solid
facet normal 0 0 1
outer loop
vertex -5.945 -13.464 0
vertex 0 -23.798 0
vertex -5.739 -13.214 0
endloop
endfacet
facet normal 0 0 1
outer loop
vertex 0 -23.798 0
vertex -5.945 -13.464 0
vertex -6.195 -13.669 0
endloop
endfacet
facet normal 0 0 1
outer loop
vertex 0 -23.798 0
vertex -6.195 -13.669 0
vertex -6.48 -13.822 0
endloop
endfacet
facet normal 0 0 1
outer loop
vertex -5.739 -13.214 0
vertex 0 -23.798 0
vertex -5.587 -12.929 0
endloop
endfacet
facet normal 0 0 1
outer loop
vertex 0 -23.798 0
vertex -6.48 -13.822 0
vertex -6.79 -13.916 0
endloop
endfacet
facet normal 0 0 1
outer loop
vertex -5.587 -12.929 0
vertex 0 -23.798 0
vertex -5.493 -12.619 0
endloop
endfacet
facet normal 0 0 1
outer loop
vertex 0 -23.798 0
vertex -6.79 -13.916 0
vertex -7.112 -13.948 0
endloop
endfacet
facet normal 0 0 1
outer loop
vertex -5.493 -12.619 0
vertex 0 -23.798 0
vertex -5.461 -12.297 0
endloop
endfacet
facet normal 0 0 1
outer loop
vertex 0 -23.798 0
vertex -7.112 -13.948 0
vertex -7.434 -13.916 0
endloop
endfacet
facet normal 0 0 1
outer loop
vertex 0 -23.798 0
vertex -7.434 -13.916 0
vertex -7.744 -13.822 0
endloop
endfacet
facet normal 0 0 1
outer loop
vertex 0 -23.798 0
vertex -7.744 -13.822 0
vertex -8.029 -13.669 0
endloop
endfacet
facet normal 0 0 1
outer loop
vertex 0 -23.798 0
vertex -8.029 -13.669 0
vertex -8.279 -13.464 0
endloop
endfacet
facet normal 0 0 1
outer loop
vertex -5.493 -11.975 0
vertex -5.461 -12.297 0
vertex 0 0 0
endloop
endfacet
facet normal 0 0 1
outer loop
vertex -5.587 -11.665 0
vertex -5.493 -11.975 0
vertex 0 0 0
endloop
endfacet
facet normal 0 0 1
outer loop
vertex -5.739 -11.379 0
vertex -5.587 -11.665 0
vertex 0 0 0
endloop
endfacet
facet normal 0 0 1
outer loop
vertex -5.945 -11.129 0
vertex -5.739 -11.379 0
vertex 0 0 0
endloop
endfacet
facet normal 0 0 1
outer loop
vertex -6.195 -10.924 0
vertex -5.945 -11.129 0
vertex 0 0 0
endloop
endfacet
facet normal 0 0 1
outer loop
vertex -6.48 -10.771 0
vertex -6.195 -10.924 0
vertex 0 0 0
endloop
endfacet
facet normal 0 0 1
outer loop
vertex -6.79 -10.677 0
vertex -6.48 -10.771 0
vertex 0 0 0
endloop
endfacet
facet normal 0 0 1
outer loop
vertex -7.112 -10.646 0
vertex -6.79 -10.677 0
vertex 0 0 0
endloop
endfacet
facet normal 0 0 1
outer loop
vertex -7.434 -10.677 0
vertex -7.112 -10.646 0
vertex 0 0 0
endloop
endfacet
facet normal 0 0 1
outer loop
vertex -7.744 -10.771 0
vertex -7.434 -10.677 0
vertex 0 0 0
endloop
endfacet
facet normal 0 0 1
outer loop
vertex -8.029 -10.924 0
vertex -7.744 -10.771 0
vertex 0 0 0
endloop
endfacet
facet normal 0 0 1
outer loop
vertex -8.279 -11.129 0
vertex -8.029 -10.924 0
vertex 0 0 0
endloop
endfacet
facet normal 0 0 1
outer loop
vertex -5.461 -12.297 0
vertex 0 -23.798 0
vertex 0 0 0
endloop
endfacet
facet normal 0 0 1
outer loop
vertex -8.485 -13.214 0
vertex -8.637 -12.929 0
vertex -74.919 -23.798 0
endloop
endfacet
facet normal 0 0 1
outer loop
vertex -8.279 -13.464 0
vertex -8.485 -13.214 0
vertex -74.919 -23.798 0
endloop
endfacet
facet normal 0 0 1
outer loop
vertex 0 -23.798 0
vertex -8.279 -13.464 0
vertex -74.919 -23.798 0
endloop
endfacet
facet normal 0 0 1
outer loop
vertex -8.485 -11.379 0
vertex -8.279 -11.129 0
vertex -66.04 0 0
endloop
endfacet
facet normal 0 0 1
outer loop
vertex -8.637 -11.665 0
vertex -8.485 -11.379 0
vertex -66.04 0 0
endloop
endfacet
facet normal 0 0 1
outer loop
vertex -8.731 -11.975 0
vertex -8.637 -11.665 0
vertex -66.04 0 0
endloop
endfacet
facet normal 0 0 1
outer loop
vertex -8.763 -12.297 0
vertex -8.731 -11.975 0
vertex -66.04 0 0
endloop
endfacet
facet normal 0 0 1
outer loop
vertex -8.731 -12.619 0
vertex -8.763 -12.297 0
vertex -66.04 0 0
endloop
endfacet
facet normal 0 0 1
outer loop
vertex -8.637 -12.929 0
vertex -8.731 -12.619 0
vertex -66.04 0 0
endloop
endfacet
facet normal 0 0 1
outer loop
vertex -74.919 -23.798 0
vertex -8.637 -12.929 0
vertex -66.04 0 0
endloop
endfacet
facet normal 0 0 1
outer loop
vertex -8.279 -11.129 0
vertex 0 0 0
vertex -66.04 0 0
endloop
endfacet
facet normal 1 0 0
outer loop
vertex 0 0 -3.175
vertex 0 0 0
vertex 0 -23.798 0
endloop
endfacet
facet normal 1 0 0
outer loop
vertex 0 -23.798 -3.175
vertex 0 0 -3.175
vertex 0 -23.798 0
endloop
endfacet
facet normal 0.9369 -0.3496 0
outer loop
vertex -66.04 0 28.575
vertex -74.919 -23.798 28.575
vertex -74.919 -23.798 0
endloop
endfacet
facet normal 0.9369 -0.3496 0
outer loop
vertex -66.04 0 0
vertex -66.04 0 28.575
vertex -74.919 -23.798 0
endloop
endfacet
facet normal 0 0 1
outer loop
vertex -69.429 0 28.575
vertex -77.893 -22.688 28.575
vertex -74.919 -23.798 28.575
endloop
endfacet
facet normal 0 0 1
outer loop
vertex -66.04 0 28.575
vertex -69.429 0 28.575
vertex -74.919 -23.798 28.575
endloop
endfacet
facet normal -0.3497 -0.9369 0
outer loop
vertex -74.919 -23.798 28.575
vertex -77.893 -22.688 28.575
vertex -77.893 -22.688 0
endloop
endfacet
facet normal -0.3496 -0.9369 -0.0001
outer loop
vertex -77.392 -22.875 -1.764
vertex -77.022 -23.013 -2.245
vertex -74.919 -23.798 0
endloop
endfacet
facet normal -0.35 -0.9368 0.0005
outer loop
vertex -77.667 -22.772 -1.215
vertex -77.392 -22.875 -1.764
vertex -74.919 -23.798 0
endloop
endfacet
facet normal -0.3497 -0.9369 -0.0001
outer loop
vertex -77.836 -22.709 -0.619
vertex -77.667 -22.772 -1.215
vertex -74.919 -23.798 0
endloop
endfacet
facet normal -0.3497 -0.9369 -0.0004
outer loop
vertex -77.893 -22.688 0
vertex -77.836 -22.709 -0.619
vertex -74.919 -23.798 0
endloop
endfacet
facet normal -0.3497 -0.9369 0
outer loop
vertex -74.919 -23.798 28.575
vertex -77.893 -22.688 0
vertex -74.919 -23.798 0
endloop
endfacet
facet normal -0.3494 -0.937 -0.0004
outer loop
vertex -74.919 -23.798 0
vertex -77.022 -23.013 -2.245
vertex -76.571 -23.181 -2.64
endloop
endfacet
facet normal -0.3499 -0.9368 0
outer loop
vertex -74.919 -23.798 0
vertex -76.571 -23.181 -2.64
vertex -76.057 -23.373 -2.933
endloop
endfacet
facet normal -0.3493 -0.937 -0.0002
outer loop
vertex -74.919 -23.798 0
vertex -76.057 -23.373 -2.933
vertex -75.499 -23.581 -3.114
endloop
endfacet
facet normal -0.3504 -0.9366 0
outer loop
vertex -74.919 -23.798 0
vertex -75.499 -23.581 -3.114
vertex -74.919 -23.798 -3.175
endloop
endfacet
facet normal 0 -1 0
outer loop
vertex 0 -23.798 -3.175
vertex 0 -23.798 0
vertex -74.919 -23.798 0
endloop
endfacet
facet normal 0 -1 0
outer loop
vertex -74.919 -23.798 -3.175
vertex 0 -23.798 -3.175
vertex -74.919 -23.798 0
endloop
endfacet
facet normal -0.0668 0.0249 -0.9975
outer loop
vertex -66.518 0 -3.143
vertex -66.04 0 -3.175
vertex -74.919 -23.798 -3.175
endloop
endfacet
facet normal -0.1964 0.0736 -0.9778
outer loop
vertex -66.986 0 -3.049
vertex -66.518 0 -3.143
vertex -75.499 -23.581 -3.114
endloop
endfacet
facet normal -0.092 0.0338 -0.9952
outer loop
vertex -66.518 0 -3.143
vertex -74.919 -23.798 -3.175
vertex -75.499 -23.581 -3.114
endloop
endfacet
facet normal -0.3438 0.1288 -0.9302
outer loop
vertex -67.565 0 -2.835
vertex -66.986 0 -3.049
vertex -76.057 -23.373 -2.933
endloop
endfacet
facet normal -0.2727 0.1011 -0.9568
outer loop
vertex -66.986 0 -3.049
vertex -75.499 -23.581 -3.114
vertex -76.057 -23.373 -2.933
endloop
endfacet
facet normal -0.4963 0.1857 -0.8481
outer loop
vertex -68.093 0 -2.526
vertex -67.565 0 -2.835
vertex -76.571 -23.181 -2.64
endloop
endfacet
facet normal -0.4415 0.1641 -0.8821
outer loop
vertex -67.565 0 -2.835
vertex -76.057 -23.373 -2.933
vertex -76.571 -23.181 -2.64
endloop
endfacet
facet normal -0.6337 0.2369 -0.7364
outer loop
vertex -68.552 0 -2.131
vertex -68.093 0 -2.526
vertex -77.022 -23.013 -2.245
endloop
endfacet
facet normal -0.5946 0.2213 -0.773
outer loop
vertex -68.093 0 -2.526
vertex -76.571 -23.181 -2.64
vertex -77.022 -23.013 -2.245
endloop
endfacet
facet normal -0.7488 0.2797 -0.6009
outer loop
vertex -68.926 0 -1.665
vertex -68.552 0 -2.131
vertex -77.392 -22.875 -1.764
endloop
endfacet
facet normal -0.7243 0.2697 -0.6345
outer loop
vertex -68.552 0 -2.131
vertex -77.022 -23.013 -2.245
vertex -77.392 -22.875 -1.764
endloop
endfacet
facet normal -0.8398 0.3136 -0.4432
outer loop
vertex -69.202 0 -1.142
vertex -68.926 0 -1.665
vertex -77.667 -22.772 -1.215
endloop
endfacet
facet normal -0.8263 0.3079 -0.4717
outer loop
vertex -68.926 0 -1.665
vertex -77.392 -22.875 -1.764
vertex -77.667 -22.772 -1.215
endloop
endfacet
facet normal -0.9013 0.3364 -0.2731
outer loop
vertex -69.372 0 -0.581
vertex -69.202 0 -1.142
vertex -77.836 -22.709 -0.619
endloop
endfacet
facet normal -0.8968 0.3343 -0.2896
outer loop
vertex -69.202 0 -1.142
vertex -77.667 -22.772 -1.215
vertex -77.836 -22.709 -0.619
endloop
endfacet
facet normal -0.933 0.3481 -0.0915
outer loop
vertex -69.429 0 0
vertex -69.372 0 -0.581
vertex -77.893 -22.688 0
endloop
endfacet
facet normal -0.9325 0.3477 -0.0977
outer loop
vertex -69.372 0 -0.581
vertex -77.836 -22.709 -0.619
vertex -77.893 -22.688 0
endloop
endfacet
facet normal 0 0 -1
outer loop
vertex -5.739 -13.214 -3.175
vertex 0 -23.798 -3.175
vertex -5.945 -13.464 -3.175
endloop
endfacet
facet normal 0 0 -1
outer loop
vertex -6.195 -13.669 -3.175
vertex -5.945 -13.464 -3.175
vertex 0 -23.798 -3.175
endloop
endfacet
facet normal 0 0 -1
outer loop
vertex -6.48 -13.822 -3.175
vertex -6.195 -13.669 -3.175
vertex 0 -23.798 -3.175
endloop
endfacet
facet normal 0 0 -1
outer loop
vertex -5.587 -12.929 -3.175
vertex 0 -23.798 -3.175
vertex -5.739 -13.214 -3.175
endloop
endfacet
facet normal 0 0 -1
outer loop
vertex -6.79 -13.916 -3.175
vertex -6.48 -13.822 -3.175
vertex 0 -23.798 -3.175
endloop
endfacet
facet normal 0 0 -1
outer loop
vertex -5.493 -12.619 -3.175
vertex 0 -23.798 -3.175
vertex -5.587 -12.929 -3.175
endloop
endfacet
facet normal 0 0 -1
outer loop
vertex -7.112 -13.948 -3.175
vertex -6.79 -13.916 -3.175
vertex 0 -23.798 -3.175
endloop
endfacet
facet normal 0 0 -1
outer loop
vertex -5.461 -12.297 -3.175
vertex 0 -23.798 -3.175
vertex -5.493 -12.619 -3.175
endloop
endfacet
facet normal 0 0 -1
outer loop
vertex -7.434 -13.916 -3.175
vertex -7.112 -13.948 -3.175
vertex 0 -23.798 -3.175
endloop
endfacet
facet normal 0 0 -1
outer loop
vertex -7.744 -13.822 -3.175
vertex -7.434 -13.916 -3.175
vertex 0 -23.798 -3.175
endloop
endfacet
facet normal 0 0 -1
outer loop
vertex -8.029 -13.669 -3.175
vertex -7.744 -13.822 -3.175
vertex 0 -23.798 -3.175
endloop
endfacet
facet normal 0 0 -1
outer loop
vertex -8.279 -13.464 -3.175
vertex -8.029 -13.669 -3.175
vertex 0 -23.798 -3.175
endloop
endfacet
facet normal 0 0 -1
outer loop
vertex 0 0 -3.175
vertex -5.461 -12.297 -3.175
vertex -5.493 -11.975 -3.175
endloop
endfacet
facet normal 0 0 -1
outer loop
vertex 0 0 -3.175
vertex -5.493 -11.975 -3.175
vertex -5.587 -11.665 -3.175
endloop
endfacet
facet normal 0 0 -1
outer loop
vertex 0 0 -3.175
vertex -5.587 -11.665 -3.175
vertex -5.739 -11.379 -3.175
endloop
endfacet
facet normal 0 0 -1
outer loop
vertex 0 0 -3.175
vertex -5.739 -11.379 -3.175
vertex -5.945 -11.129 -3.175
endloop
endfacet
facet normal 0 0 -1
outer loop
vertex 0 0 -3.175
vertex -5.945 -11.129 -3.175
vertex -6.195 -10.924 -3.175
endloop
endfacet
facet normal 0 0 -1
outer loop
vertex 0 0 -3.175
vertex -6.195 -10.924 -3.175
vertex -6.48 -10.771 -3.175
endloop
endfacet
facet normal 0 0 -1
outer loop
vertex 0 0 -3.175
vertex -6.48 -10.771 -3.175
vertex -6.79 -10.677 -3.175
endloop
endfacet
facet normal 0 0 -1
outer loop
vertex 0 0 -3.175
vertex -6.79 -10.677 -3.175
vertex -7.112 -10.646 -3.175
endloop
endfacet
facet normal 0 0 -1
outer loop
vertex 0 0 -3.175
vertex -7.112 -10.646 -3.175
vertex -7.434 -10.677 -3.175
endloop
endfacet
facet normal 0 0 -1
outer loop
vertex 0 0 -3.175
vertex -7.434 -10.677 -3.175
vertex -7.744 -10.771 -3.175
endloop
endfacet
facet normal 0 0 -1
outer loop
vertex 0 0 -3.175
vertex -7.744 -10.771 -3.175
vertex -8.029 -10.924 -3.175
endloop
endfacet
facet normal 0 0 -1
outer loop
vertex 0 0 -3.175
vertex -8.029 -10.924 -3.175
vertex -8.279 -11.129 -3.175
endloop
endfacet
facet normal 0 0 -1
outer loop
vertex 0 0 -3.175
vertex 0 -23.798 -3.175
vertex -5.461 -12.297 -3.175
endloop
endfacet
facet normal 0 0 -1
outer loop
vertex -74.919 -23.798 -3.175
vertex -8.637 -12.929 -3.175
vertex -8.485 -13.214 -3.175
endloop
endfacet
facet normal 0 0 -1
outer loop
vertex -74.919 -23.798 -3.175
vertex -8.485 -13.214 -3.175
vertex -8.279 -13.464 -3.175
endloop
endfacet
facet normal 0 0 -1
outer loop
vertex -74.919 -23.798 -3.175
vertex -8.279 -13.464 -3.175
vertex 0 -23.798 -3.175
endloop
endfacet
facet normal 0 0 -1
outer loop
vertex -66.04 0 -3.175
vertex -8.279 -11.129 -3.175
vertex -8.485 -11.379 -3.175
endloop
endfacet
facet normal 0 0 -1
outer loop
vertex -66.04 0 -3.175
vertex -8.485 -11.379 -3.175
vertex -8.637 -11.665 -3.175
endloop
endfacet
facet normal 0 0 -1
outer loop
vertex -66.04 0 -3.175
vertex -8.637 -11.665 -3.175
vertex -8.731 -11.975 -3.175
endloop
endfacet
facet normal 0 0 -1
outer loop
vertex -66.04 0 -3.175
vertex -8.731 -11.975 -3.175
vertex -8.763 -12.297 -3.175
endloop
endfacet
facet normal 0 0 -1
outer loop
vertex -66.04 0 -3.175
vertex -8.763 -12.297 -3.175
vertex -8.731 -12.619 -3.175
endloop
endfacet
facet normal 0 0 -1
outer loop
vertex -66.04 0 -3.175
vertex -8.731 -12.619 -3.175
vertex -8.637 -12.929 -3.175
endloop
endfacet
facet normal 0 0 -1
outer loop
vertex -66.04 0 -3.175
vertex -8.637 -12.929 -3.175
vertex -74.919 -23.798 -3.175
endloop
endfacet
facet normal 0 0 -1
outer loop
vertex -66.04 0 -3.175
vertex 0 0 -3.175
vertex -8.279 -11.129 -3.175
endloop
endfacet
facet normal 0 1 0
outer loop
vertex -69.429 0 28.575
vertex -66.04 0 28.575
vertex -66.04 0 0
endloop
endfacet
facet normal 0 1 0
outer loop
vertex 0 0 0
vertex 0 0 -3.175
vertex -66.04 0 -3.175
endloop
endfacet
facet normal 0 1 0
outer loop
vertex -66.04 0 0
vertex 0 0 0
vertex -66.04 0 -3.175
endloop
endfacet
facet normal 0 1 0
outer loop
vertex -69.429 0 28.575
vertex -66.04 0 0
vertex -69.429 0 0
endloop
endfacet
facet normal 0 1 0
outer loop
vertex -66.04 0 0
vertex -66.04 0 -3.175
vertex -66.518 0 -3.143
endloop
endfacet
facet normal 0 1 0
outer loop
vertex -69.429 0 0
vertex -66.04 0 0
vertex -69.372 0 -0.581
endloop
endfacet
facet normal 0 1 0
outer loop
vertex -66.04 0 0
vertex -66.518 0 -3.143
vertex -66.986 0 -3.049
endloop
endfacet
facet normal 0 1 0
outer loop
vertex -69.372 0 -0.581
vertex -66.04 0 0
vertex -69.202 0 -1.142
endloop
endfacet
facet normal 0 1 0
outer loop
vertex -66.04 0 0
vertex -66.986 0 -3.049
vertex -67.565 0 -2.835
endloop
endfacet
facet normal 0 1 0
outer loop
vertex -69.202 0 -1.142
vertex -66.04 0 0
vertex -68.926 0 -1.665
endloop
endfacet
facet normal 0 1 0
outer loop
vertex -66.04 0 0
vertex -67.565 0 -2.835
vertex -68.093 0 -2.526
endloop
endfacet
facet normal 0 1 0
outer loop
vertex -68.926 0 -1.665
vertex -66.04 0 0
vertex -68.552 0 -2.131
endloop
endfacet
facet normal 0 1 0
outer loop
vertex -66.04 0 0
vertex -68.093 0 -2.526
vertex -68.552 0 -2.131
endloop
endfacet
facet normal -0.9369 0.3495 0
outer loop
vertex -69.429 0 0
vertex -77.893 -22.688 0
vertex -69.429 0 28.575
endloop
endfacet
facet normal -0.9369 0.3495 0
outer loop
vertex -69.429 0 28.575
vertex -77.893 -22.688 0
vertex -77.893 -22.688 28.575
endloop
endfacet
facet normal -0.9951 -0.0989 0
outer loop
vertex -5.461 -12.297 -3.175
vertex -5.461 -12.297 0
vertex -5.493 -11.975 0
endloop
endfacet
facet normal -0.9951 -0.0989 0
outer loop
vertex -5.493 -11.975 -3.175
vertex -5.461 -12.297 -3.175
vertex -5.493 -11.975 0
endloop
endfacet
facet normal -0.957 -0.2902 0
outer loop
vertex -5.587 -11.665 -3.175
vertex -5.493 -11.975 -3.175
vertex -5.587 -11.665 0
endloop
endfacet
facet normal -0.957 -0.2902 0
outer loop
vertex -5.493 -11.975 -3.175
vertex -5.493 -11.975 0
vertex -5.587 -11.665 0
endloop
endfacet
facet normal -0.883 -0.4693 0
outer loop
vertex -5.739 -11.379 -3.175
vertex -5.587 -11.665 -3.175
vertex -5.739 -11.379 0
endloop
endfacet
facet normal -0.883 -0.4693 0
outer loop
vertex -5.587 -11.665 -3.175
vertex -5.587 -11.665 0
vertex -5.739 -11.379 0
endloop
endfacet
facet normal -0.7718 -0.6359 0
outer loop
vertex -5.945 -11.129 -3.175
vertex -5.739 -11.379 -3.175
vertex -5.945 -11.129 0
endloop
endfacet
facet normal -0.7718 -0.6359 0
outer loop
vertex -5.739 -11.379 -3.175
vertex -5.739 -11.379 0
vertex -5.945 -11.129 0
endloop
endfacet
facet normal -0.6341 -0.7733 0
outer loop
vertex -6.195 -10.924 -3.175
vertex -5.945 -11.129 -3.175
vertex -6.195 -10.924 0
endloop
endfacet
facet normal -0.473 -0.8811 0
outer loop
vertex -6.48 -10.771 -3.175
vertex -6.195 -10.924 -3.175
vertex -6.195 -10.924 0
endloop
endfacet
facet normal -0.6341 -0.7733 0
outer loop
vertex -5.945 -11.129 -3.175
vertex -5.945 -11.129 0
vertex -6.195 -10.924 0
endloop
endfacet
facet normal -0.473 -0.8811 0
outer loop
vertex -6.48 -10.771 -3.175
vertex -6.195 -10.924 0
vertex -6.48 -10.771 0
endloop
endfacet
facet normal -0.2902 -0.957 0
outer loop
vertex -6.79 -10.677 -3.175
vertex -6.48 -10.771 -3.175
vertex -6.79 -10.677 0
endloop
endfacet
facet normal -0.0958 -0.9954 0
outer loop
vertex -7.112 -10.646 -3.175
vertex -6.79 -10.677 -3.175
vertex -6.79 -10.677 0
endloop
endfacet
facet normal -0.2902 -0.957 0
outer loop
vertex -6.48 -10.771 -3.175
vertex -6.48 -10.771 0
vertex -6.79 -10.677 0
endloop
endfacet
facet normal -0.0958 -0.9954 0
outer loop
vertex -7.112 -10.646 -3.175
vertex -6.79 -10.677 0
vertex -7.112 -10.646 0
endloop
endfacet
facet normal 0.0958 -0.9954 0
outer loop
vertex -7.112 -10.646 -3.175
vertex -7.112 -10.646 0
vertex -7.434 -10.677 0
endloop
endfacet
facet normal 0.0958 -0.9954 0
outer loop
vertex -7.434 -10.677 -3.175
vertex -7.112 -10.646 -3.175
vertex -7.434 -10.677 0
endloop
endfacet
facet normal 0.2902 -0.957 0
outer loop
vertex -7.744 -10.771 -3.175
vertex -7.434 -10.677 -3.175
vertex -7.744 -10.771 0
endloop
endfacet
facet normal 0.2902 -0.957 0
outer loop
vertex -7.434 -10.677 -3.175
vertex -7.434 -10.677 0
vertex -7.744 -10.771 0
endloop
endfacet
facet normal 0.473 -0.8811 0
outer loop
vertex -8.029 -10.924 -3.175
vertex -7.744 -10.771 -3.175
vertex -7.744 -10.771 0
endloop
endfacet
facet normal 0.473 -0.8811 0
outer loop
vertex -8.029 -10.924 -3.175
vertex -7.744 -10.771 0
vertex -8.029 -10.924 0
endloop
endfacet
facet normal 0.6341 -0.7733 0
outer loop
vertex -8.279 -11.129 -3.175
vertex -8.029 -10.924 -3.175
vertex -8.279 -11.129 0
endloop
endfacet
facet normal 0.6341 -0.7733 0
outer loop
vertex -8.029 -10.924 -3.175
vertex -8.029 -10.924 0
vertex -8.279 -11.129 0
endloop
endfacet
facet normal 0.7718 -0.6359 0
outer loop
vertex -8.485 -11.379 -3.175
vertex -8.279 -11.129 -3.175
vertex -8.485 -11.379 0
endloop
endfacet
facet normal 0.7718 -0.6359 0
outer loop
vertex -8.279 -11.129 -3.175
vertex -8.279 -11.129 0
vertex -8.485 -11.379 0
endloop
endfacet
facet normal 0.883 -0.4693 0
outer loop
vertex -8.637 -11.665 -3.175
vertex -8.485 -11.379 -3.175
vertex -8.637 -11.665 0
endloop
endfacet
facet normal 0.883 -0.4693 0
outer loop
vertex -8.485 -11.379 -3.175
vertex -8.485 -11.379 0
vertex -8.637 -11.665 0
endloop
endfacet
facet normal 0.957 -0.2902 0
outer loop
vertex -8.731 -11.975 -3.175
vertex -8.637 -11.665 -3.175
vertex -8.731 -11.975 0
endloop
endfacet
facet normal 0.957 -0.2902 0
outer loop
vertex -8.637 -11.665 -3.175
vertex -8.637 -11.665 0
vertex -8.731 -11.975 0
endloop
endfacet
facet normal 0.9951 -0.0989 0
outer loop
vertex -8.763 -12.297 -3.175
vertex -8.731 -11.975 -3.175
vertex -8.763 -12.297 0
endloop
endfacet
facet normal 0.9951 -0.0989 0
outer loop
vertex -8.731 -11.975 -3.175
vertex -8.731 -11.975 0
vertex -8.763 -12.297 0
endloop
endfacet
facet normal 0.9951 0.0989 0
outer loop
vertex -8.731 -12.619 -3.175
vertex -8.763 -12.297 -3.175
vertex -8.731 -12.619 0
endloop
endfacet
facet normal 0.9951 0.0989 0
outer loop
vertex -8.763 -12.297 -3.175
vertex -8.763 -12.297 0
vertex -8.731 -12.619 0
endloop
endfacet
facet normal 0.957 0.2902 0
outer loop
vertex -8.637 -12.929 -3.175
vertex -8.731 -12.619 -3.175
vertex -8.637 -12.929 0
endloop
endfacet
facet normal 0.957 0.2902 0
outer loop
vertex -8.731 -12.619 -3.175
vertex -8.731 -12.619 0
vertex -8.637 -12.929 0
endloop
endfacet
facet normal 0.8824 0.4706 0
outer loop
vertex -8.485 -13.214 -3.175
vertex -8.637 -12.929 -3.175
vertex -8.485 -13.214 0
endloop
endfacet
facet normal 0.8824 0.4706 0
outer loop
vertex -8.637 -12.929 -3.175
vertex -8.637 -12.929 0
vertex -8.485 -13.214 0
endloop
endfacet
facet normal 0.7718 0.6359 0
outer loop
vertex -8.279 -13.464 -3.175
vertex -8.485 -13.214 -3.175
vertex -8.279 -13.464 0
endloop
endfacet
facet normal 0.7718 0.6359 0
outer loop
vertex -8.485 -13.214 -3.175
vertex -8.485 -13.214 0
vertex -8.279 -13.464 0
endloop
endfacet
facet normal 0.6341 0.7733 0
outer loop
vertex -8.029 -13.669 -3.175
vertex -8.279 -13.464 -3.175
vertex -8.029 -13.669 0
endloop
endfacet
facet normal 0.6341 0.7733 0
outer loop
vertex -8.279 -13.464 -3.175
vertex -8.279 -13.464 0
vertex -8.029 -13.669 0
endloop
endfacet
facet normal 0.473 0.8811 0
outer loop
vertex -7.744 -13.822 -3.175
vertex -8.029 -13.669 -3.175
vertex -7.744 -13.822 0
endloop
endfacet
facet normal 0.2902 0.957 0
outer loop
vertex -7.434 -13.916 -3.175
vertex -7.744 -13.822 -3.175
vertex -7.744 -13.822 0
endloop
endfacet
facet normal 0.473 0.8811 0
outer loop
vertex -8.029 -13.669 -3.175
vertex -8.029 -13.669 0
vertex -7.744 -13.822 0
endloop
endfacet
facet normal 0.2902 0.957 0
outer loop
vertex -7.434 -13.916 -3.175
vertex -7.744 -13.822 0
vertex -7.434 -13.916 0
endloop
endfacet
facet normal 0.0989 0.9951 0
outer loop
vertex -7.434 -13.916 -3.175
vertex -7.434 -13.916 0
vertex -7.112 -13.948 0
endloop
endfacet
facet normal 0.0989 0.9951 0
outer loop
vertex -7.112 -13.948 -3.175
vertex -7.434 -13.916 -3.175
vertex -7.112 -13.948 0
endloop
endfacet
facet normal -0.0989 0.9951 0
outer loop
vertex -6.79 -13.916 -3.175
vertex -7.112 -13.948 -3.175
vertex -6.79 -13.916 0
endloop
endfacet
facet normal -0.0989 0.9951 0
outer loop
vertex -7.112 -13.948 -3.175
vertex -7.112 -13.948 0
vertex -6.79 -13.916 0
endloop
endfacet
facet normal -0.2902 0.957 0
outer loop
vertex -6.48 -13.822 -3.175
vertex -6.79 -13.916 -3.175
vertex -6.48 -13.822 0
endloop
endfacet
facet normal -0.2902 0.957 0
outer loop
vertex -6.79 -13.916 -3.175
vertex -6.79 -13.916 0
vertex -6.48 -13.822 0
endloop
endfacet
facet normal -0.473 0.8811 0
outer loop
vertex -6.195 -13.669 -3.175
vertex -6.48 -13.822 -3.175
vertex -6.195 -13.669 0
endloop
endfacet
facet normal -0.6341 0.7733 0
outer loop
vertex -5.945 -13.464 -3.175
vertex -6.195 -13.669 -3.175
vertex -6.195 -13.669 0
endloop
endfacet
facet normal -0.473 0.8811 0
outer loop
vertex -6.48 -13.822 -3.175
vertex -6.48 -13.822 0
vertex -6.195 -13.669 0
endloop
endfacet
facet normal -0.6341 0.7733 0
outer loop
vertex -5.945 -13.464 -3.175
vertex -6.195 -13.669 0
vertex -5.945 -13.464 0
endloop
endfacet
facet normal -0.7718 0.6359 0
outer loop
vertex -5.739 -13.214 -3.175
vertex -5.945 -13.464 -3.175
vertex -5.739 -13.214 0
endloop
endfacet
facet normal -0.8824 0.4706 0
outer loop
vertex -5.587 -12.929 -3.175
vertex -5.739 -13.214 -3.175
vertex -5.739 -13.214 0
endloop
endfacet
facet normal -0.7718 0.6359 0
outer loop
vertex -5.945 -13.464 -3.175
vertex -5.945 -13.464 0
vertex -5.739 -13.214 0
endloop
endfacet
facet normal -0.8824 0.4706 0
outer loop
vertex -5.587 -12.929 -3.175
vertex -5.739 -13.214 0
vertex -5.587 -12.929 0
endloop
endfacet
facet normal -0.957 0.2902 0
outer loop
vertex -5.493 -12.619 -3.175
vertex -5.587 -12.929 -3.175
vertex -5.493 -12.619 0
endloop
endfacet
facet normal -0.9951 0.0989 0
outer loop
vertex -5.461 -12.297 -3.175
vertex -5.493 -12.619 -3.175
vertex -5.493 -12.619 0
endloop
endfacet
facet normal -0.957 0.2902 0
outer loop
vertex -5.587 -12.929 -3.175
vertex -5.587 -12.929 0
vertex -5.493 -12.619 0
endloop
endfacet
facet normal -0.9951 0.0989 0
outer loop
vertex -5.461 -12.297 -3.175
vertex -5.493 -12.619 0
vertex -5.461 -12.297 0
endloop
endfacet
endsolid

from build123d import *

# Parameters (mm, degrees)
SKETCH13_R              = 1.651
BASE_FLANGE5_DEPTH      = 3.175
EDGE_FLANGE4_START      = -48.484504913
EDGE_FLANGE4_DEPTH      = 25.4
CUT_EXTRUDE4_DEPTH      = 34.925
CUT_EXTRUDE4_DEPTH_BACK = 5.588


# Read off the part's stored shape, not the designer's step: Edge-Flange4
# Sheet-metal steps are written as plain solids
with BuildPart() as part:
    # Sketch13 → Base-Flange5 (new body)
    with BuildSketch(Plane.XY):
        Polygon((-66.04, 0), (0, 0), (0, -23.797677877), (-74.918655736, -23.797677877), align=None)
        with Locations((-7.112, -12.296727665)):
            Circle(SKETCH13_R, mode=Mode.SUBTRACT)
    extrude(amount=-BASE_FLANGE5_DEPTH)

    # Edge-Flange4 outline → Edge-Flange4 (add)
    with BuildSketch(Plane(origin=(0, 0, 0), x_dir=(0.9369164518419233, -0.34955337542060905, 0), z_dir=(0.34955337542060905, 0.9369164518419232, 0)).offset(EDGE_FLANGE4_START)):
        with BuildLine():
            Line((-61.87396248, -28.575), (-61.87396248, 3.175))
            ThreePointArc((-61.87396248, 3.175), (-64.11902651, 2.24506403), (-65.04896248, 0))
            Line((-65.04896248, 0), (-65.04896248, -28.575))
            Line((-65.04896248, -28.575), (-61.87396248, -28.575))
        make_face()
    extrude(amount=EDGE_FLANGE4_DEPTH)

    # Sketch51 → Cut-Extrude4 (cut, two sides: drawn at the far end of the back side and taken through both)
    with BuildSketch(Plane.XY.offset(-CUT_EXTRUDE4_DEPTH_BACK)):
        Polygon((-66.04, 0), (-69.428776015, 0), (-69.014709735, 1.109831967), align=None)
    extrude(amount=CUT_EXTRUDE4_DEPTH + CUT_EXTRUDE4_DEPTH_BACK, mode=Mode.SUBTRACT)


solid = part.part
